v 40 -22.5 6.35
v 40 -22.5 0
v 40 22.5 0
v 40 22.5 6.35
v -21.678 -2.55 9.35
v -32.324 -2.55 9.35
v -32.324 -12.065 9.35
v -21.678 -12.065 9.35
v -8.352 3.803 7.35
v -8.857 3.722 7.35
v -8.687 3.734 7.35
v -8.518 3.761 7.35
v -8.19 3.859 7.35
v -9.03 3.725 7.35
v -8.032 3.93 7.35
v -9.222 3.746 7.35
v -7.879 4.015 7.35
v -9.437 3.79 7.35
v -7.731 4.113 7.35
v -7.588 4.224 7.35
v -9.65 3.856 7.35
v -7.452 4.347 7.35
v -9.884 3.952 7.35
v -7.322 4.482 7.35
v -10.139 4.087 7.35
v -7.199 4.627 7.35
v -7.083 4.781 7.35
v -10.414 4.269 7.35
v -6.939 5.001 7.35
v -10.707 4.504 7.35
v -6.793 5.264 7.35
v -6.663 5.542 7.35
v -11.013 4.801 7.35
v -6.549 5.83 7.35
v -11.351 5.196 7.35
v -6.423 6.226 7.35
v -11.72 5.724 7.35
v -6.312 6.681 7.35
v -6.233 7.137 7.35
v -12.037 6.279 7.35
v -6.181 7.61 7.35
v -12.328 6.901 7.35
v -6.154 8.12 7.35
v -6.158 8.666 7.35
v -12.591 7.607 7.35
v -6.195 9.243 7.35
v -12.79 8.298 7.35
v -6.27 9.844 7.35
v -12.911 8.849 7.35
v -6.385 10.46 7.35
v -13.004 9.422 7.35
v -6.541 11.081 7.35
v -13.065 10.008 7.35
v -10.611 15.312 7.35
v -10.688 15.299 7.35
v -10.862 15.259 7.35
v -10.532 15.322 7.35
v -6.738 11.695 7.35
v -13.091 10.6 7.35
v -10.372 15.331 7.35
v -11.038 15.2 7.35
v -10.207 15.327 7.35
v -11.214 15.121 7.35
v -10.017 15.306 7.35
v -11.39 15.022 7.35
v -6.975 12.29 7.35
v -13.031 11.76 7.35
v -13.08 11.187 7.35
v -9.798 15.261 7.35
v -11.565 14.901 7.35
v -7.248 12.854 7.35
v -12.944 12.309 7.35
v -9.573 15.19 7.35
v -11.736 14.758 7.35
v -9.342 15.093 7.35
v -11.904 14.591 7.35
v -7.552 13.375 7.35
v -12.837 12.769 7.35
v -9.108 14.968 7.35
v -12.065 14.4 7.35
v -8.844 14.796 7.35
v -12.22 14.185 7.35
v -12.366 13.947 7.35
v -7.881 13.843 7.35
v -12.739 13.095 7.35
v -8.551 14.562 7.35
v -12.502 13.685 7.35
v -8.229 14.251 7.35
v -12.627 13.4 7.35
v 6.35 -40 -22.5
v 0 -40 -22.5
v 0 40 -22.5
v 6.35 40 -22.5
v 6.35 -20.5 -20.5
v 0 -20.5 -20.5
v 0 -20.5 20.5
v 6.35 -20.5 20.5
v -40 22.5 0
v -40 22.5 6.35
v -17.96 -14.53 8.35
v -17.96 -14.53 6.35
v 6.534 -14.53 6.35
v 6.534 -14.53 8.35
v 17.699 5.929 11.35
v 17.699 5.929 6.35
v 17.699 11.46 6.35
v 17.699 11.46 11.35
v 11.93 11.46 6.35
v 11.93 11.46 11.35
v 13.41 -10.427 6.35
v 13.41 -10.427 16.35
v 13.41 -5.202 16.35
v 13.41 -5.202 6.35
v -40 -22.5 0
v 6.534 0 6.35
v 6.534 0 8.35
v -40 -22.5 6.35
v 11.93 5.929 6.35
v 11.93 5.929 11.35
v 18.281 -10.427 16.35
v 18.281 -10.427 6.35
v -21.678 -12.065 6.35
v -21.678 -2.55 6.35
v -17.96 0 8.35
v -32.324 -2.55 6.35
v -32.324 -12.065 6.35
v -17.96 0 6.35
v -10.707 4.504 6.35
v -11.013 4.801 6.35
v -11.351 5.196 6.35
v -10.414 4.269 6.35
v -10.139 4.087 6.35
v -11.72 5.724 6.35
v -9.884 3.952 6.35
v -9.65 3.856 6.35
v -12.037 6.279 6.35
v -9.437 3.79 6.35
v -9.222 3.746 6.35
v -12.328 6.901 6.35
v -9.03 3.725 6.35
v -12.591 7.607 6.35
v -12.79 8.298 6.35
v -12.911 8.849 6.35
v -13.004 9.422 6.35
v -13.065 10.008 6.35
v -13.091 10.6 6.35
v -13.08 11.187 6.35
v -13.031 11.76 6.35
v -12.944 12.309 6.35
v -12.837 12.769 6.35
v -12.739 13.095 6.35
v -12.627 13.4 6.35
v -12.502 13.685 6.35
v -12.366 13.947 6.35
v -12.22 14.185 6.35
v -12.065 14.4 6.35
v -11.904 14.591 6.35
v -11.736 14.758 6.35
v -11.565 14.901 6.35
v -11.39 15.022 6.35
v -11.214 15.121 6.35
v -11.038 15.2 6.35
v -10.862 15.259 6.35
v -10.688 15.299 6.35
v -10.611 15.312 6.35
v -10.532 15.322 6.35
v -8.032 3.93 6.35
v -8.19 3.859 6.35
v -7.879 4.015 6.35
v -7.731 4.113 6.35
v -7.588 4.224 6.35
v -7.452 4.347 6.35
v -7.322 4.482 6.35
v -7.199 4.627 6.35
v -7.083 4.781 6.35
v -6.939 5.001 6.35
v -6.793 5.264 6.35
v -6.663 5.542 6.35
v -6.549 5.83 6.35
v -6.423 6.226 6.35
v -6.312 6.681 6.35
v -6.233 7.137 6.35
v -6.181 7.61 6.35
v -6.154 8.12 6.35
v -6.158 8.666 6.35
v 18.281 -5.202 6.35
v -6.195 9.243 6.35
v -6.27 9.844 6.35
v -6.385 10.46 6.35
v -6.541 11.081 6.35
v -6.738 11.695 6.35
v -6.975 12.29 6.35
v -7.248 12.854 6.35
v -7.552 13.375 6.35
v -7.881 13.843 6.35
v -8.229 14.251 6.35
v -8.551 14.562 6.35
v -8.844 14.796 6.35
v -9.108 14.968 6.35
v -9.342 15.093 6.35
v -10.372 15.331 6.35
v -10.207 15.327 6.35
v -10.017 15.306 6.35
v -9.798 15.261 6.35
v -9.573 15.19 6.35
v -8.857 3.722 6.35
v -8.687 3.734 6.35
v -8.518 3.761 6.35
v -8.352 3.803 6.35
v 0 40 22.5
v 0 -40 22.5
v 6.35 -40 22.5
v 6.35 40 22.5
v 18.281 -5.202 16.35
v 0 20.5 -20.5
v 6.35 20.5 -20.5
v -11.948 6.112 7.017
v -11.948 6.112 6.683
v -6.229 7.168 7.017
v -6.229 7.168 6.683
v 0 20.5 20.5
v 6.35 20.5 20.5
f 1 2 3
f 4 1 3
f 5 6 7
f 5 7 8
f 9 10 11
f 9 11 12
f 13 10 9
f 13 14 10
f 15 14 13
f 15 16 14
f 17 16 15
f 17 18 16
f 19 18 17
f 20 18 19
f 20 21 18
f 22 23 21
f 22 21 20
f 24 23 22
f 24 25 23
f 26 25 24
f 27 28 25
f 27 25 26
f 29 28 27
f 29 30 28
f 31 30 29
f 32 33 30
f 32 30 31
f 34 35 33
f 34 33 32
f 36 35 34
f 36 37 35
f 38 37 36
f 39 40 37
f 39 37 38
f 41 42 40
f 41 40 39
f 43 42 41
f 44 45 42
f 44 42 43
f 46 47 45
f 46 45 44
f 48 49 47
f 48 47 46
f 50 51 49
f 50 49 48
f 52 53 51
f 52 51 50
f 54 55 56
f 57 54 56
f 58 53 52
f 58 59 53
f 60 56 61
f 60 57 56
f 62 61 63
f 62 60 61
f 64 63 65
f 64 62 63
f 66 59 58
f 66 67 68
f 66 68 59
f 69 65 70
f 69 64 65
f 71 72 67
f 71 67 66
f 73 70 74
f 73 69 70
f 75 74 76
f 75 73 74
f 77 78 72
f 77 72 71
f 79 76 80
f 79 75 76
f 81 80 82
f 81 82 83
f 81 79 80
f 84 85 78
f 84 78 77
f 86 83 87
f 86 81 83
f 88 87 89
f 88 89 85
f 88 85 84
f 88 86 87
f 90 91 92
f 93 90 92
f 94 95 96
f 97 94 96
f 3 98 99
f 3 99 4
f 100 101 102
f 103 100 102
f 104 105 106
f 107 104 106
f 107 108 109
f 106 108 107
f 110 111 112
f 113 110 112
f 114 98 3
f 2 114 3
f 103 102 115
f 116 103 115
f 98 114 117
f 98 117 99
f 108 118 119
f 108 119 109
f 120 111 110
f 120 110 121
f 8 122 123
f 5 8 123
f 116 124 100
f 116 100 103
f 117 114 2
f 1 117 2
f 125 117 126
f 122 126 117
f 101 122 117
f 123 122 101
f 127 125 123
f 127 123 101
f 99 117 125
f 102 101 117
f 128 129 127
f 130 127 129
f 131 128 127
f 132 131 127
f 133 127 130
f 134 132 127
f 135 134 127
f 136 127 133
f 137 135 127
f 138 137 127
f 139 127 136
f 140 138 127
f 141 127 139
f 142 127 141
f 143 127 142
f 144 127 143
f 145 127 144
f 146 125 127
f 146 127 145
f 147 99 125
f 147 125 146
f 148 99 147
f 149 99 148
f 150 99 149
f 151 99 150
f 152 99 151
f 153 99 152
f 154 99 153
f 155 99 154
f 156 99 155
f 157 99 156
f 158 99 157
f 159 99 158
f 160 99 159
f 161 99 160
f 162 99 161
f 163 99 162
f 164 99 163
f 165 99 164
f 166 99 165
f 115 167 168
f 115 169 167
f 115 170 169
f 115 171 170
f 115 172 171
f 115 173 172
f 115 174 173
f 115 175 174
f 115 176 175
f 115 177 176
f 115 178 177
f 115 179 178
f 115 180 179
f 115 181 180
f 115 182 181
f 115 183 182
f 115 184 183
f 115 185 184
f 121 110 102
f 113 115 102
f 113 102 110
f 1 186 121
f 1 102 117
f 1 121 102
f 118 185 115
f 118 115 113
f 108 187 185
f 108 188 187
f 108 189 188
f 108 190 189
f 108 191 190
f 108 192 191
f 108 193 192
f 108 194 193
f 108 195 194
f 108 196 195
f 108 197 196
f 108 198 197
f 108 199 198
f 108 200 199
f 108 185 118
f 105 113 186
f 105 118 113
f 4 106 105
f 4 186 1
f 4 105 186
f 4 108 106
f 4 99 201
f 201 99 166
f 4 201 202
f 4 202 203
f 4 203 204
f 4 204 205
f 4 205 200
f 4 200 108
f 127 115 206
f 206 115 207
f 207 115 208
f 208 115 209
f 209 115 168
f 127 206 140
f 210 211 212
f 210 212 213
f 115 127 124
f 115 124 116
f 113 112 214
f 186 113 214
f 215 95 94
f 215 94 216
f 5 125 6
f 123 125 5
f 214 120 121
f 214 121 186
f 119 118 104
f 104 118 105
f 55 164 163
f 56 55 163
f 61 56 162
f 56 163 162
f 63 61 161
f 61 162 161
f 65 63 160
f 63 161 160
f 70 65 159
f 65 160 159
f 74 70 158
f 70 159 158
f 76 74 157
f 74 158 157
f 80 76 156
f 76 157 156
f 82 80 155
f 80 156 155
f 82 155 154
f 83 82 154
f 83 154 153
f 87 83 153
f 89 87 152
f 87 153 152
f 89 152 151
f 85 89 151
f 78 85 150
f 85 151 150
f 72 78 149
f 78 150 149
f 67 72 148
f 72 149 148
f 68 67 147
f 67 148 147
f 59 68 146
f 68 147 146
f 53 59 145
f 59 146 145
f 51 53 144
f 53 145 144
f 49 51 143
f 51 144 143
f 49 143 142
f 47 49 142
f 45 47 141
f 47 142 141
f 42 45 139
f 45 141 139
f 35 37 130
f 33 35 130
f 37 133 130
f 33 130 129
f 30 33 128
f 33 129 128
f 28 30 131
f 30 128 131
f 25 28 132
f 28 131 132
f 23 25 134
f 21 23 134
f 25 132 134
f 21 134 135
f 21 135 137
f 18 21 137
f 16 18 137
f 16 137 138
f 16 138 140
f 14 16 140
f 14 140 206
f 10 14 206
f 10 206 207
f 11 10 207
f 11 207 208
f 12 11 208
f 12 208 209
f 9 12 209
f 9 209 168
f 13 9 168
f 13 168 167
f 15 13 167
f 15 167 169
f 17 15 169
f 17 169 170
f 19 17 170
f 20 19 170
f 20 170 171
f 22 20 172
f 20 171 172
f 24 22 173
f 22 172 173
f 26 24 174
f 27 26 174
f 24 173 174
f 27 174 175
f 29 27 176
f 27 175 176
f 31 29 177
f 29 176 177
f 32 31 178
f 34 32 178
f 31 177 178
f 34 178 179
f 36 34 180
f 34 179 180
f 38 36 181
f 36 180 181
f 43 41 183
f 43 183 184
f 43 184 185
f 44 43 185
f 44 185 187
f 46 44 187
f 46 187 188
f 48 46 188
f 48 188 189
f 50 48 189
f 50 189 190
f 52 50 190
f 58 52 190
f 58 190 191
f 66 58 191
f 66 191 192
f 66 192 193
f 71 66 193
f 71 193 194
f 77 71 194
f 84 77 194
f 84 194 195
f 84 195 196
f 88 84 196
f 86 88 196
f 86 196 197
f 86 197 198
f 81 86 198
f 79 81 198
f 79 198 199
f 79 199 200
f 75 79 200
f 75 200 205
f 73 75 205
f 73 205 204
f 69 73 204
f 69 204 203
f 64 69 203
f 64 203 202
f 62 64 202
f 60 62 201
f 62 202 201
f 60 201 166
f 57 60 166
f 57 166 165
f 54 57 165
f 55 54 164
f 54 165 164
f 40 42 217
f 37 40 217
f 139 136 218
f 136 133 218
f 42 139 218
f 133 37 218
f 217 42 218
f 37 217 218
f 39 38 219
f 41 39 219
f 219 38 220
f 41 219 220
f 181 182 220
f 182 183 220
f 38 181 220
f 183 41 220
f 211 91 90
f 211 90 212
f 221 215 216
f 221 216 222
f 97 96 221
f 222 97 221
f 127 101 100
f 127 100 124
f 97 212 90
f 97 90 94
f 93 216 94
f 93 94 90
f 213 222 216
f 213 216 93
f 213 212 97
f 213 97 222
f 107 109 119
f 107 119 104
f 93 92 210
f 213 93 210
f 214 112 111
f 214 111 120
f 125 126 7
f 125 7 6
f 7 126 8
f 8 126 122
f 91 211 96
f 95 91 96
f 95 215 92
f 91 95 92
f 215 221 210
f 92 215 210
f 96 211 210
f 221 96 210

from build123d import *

# Parameters (mm, degrees)
F0_W      = 80
F0_H      = 45
F0_W_2    = 41
F0_H_2    = 41
F1_DEPTH  = 6.35
F2_W      = 80
F2_H      = 45
F3_DEPTH  = 6.35
F4_W      = 24.494496
F4_H      = 14.529799
F5_DEPTH  = 2
F6_W      = 10.645555
F6_H      = 9.515388
F7_DEPTH  = 3
F9_DEPTH  = 1
F10_W     = 4.871065
F10_H     = 5.224564
F11_DEPTH = 10
F12_W     = 5.768938
F12_H     = 5.530469
F13_DEPTH = 5


with BuildPart() as f1:
    # F0 (on Right) → F1 (new body)
    with BuildSketch(Plane.YZ):
        Rectangle(F0_W, F0_H)
        Rectangle(F0_W_2, F0_H_2, mode=Mode.SUBTRACT)
    extrude(amount=F1_DEPTH)


with BuildPart() as f3:
    # F2 (on Top) → F3 (new body)
    with BuildSketch(Plane.XY):
        Rectangle(F2_W, F2_H)
    extrude(amount=F3_DEPTH)

    # F4 (on face) → F5 (join)
    with BuildSketch(Plane.XY.offset(6.35)):
        with Locations((-5.713129, -7.264899)):
            Rectangle(F4_W, F4_H)
    extrude(amount=F5_DEPTH)

    # F6 (on face) → F7 (join)
    with BuildSketch(Plane.XY.offset(6.35)):
        with Locations((-27.001003, -7.307802)):
            Rectangle(F6_W, F6_H)
    extrude(amount=F7_DEPTH)

    # F8 (on face) → F9 (join)
    with BuildSketch(Plane.XY.offset(6.35)):
        with BuildLine():
            add(Edge.make_bspline(
                [(-10.687758, 15.299371), (-16.407278, 14.243105), (-11.948368, 6.112081), (-7.489459, -2.018943), (-6.228849, 7.168346), (-4.968238, 16.355636), (-10.687758, 15.299371)],
                knots=[0, 0, 0, 2.094395, 2.094395, 4.18879, 4.18879, 6.283185, 6.283185, 6.283185], degree=2, weights=[1, 0.5, 1, 0.5, 1, 0.5, 1]))
        make_face()
    extrude(amount=F9_DEPTH)

    # F10 (on face) → F11 (join)
    with BuildSketch(Plane.XY.offset(6.35)):
        with Locations((15.845646, -7.814308)):
            Rectangle(F10_W, F10_H)
    extrude(amount=F11_DEPTH)

    # F12 (on face) → F13 (join)
    with BuildSketch(Plane.XY.offset(6.35)):
        with Locations((14.81475, 8.694622)):
            Rectangle(F12_W, F12_H)
    extrude(amount=F13_DEPTH)


solid = Compound([f1.part, f3.part])
